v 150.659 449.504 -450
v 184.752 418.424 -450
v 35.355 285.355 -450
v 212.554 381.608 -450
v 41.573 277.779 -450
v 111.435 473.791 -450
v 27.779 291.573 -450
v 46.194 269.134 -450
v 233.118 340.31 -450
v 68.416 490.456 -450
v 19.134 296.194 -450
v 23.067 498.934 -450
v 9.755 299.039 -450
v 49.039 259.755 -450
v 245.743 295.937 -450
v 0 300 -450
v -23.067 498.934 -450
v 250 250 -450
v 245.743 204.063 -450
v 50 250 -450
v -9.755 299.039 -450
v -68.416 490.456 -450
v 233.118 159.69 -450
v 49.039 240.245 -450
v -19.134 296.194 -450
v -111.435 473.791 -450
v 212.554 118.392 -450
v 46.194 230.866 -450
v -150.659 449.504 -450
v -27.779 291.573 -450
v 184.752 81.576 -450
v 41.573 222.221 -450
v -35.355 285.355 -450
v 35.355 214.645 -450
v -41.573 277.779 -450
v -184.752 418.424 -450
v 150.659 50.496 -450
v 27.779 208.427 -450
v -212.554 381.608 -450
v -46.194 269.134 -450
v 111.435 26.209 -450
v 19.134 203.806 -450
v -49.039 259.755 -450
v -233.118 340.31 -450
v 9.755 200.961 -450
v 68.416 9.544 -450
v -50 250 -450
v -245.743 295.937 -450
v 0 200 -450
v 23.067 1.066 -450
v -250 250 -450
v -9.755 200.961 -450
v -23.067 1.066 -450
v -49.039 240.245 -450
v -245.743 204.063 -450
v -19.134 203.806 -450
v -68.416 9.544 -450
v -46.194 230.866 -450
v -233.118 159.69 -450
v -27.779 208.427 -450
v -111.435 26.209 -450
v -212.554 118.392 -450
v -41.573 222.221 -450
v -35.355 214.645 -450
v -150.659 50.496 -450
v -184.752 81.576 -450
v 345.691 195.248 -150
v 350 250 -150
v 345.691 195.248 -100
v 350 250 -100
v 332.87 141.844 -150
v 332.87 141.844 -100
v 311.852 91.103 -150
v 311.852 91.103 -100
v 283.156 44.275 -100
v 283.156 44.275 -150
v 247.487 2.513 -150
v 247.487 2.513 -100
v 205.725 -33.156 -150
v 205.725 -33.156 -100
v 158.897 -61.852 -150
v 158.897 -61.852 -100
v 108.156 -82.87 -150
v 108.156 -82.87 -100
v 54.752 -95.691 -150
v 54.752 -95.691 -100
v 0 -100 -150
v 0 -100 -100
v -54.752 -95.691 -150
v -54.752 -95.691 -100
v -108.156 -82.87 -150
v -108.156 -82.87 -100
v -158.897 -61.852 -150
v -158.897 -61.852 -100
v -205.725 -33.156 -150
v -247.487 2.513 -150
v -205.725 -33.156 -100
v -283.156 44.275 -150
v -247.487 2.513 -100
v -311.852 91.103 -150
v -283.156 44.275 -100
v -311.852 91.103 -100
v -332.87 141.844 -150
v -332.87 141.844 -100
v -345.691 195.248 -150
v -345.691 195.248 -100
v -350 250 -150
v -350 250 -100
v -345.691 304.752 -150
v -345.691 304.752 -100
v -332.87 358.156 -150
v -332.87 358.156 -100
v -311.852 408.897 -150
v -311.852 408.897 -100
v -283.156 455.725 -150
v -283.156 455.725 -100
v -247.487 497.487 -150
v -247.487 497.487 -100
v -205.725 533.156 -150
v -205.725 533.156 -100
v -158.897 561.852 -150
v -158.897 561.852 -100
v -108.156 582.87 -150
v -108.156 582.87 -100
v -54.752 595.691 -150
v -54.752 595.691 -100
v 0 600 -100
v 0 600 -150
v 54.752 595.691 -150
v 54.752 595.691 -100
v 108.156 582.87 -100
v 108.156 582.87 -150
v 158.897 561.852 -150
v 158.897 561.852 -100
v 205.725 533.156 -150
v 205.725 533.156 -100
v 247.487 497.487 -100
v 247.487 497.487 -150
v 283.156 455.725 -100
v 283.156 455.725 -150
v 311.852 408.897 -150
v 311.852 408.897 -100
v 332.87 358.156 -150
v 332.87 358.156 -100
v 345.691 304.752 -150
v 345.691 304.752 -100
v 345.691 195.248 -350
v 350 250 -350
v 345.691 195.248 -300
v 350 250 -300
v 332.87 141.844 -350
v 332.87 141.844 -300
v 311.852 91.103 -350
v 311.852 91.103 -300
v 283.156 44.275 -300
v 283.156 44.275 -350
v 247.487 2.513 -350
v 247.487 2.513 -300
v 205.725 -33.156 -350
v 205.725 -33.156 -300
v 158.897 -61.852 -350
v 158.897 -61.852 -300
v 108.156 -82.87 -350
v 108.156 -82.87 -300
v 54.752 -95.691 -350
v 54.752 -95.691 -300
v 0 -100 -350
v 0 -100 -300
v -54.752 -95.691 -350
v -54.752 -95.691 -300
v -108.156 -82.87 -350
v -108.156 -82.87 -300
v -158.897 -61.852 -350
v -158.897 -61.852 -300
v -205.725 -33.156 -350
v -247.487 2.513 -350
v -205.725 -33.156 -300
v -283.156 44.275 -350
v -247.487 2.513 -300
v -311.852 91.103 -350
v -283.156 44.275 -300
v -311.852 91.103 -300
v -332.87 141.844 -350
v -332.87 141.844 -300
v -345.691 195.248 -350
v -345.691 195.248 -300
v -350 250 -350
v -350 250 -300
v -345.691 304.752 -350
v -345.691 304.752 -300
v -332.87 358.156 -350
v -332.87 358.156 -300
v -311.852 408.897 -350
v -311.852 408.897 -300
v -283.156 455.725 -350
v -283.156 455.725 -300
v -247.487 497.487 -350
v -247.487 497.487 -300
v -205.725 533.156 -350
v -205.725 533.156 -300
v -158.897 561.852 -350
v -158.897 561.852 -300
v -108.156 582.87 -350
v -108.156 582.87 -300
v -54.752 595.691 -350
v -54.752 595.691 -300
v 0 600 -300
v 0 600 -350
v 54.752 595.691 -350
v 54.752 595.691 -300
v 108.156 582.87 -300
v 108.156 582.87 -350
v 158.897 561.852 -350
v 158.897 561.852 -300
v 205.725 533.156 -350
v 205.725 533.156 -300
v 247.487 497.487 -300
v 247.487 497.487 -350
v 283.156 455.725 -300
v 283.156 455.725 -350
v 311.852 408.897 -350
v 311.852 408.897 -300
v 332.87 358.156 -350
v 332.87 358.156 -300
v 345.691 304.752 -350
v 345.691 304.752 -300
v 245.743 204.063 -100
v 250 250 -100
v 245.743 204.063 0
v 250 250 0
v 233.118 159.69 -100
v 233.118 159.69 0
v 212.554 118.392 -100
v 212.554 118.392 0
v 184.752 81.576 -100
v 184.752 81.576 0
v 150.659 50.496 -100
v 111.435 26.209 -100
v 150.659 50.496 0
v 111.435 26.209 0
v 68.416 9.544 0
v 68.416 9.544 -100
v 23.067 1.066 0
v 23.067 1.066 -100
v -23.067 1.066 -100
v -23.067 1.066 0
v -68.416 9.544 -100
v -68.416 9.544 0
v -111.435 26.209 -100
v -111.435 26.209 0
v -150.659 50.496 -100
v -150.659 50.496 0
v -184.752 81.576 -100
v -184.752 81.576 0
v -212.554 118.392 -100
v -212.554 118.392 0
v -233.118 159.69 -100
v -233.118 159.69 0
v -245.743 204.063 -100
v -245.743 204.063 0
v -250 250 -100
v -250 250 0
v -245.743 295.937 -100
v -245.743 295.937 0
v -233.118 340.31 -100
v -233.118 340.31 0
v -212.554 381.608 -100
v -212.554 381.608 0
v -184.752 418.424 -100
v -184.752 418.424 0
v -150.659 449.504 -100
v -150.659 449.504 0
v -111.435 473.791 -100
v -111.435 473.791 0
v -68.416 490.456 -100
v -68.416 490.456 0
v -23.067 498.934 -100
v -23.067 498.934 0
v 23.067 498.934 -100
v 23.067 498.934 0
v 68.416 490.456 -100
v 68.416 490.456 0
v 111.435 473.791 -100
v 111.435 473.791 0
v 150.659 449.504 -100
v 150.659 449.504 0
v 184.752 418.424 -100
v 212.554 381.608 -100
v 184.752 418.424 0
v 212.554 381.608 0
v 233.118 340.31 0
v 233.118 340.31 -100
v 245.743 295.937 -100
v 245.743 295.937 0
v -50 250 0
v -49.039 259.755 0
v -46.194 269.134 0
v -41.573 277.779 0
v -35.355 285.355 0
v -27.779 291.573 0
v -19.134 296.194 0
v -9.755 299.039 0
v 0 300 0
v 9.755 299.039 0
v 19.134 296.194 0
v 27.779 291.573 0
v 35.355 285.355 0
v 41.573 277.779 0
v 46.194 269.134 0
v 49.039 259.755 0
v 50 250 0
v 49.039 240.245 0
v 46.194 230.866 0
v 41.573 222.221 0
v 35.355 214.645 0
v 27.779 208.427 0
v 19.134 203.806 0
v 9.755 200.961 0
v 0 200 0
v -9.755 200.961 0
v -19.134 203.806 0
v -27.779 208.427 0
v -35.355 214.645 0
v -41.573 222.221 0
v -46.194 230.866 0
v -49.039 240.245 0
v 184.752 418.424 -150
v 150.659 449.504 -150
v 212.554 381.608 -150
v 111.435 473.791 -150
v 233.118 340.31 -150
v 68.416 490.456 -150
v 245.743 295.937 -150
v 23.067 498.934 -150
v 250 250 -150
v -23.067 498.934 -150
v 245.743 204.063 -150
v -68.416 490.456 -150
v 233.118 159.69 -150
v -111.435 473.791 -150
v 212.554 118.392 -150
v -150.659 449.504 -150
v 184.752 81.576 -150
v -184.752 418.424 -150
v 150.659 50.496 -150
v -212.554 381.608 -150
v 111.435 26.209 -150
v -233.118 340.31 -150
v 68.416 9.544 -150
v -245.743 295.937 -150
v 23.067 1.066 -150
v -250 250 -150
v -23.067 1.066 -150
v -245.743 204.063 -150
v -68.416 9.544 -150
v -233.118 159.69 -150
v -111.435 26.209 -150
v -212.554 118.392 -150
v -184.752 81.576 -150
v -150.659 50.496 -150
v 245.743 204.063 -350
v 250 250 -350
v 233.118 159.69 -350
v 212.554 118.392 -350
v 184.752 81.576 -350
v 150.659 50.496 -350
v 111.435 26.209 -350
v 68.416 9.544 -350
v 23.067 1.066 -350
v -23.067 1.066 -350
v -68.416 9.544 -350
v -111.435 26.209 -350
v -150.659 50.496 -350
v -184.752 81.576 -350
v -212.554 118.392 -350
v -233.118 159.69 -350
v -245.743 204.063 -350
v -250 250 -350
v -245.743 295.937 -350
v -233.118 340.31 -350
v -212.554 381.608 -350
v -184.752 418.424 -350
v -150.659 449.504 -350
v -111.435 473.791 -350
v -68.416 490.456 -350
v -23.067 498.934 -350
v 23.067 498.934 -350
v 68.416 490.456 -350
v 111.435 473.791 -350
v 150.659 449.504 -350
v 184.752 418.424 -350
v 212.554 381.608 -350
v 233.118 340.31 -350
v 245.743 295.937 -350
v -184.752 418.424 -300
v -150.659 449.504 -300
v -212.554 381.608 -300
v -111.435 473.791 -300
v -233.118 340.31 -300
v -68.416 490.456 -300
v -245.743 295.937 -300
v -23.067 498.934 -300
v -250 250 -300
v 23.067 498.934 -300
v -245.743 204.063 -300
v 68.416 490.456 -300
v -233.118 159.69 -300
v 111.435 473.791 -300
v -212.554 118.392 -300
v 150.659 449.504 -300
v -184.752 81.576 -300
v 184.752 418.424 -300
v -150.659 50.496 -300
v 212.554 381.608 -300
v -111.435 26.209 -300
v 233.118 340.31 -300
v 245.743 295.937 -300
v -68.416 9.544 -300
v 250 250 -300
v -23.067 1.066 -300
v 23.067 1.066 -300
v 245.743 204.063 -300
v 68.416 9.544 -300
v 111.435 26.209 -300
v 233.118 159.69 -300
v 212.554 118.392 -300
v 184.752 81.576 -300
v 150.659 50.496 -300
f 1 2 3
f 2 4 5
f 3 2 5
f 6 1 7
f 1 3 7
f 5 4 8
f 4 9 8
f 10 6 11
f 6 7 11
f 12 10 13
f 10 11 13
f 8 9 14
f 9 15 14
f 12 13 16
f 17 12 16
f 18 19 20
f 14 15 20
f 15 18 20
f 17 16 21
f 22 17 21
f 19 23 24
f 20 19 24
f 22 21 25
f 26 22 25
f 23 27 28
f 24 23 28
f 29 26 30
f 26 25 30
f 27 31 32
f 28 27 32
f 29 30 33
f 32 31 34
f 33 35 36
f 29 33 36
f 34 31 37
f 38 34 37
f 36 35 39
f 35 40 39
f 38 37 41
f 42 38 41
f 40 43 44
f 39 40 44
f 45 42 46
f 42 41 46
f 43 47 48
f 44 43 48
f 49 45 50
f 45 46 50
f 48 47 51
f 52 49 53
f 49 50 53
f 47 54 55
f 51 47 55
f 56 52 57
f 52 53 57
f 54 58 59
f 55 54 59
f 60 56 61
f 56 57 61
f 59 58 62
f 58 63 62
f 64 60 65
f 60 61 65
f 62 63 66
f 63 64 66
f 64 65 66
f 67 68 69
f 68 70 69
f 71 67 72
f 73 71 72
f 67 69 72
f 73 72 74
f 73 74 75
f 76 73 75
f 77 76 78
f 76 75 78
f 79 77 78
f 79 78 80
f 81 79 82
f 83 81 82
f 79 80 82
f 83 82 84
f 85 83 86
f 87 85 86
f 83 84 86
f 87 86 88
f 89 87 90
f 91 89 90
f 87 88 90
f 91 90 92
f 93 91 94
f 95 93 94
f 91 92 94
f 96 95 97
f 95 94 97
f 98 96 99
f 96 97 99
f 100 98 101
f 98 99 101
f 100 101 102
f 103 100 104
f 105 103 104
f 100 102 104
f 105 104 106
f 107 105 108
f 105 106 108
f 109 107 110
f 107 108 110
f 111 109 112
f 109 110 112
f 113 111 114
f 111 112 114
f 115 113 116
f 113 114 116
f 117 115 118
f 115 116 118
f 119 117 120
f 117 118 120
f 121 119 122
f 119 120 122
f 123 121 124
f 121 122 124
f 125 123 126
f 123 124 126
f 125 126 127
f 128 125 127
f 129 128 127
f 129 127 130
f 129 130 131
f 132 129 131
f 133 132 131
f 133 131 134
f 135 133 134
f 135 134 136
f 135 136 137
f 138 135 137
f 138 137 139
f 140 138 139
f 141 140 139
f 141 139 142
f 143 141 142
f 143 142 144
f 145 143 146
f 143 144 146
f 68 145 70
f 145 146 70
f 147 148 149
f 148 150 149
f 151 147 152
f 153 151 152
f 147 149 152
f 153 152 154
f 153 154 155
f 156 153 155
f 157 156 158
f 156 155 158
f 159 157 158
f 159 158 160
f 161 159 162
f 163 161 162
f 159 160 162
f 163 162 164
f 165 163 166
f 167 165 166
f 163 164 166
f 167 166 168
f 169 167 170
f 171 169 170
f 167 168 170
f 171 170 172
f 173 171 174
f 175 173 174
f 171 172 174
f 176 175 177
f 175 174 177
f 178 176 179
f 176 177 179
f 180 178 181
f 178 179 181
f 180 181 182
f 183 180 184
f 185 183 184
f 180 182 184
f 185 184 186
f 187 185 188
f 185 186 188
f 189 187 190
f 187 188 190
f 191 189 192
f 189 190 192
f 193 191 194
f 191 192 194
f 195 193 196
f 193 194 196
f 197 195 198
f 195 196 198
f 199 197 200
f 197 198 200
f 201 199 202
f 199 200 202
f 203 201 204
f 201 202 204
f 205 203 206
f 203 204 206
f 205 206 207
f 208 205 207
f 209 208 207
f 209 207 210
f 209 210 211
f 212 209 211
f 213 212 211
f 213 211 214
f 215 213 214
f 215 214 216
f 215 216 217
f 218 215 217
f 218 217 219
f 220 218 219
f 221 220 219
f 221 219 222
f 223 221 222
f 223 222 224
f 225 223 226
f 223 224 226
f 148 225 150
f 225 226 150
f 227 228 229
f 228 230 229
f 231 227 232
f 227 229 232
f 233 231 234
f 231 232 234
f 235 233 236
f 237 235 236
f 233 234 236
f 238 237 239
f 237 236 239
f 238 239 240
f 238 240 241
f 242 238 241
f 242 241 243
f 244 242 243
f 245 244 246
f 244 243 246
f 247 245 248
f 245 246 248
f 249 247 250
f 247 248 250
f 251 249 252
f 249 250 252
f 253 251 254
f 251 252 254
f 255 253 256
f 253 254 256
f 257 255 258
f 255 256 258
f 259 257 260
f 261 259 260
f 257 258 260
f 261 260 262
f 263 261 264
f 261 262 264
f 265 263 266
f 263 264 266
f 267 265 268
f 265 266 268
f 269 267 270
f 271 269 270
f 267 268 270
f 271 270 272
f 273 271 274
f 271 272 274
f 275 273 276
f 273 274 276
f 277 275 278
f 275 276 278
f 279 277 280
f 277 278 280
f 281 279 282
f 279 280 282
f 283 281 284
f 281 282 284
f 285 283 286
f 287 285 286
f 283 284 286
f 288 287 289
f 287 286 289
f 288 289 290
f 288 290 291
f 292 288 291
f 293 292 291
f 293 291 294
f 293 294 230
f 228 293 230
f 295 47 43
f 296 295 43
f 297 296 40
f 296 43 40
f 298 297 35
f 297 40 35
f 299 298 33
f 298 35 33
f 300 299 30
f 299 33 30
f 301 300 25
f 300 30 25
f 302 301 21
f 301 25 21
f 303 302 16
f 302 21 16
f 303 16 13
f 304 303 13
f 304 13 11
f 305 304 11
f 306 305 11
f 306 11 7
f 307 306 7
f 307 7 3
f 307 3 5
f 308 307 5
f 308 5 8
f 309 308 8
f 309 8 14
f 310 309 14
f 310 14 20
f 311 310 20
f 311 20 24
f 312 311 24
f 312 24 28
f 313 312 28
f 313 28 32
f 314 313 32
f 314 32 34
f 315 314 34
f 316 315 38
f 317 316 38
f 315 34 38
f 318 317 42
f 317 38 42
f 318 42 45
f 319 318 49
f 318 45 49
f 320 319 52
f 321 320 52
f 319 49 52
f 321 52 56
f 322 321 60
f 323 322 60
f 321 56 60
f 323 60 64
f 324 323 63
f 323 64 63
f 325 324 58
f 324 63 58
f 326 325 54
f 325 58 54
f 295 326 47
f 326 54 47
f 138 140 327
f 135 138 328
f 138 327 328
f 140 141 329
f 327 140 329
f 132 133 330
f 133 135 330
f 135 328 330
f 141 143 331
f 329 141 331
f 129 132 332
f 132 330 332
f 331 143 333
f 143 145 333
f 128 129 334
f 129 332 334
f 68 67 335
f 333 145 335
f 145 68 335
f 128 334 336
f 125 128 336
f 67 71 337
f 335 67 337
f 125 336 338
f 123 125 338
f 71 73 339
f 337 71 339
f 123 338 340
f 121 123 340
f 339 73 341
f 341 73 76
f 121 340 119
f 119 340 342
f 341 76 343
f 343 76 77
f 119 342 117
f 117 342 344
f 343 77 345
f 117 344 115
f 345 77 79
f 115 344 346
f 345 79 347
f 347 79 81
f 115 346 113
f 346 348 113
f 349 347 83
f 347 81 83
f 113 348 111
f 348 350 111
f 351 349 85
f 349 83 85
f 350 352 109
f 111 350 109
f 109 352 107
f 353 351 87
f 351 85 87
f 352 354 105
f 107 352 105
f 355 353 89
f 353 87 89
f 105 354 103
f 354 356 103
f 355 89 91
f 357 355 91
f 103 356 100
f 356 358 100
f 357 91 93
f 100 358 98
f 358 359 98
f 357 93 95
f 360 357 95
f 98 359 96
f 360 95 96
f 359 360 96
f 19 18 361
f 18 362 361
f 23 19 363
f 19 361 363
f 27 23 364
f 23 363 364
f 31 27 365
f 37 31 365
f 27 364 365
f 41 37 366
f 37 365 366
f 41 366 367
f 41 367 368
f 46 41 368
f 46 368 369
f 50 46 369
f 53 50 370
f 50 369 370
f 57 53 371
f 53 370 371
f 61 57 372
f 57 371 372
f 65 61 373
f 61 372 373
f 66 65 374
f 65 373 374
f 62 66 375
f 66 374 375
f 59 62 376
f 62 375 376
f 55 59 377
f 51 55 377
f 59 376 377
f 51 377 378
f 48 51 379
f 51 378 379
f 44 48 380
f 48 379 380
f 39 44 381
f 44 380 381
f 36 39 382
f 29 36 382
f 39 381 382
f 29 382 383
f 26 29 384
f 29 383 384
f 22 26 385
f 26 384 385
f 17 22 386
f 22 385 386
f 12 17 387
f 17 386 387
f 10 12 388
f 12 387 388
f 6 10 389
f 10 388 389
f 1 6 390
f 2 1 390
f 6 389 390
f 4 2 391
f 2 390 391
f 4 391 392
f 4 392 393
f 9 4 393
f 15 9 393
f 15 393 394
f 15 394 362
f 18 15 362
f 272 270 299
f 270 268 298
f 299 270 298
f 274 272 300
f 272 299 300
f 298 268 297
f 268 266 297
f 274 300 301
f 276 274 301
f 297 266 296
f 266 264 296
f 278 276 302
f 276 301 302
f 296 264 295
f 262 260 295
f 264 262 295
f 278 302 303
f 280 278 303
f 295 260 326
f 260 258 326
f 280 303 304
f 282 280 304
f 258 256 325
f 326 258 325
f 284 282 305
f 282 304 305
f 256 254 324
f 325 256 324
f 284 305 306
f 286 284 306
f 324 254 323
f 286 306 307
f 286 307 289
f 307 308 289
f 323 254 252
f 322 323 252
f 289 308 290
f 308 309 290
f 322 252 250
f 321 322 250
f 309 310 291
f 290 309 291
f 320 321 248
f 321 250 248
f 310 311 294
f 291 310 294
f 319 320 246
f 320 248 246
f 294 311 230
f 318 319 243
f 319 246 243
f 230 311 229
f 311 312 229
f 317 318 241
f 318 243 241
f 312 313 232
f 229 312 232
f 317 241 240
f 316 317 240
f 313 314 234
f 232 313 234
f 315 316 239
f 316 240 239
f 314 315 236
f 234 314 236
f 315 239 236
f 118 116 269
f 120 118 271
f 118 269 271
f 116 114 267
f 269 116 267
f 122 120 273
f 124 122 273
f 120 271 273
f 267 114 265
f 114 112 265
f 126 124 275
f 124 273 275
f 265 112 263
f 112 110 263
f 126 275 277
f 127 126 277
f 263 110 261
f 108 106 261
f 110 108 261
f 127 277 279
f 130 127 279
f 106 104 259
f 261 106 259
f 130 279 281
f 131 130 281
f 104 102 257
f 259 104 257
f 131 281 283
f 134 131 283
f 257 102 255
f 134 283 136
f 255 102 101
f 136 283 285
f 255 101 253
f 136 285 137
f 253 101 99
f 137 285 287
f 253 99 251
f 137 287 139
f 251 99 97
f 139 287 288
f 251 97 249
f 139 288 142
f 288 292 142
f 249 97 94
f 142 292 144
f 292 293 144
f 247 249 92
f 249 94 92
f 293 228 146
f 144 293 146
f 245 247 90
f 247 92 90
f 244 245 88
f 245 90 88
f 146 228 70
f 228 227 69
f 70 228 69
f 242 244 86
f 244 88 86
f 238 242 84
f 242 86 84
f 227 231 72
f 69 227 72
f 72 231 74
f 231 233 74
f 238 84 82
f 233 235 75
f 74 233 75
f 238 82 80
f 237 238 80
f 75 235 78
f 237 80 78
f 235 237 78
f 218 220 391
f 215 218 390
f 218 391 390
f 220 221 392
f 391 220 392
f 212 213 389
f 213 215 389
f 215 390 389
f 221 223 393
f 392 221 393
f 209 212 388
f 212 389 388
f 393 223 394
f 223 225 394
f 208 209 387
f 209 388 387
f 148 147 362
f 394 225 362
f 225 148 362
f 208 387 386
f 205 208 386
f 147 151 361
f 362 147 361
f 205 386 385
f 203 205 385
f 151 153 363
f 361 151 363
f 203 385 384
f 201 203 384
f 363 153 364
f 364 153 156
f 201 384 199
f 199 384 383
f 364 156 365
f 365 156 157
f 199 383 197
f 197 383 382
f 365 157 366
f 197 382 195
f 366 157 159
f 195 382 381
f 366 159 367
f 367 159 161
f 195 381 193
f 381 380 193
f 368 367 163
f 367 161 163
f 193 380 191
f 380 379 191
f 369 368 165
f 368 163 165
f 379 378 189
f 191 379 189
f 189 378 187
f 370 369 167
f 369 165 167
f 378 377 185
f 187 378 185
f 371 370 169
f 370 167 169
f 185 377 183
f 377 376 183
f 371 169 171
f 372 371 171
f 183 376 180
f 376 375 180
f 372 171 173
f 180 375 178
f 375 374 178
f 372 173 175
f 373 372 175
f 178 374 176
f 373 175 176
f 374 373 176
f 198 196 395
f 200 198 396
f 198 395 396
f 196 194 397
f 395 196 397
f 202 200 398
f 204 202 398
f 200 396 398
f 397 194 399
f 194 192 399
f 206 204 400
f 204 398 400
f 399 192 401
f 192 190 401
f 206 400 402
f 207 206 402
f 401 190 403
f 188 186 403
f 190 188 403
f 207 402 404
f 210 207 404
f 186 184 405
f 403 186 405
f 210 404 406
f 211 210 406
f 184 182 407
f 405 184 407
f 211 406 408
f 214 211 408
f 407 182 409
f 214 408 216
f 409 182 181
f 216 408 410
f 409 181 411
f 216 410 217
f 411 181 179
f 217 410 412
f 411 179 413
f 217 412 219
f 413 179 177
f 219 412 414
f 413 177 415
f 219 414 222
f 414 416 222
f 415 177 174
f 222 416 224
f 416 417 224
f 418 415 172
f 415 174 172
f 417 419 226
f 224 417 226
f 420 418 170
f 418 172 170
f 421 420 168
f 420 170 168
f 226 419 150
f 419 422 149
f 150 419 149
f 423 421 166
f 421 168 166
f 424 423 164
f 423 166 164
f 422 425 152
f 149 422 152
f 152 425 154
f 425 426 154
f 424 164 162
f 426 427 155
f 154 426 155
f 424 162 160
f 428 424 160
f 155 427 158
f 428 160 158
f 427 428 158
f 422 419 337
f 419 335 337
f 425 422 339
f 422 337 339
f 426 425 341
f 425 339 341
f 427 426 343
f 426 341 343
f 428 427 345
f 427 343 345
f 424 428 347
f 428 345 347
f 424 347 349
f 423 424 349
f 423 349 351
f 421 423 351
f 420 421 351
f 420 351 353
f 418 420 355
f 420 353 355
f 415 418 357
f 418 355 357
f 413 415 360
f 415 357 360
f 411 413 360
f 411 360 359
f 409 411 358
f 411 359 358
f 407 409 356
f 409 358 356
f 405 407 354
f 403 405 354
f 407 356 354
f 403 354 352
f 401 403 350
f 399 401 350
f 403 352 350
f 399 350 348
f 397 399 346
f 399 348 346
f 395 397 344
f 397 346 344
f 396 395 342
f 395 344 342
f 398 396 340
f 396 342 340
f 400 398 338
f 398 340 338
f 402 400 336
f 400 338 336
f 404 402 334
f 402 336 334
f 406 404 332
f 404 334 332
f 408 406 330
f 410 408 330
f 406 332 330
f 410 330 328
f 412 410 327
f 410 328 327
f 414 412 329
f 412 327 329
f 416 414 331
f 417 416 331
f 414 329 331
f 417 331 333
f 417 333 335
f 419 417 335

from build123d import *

# Parameters (mm, degrees)
SKETCH2_R          = 50
CUT_EXTRUDE1_DEPTH = 828.647267862


with BuildPart() as part:
    # Sketch1 → Revolve1 (revolve)
    with BuildSketch(Plane(origin=(0, 0, 0), x_dir=(0, 0, -1), z_dir=(1, 0, 0)), mode=Mode.PRIVATE) as revolve1_sk:
        Polygon((0, 0), (0, 250), (450, 250), (450, 0), (350, 0), (350, -100), (300, -100), (300, 0), (150, 0), (150, -100), (100, -100), (100, 0), align=None)
    revolve(revolve1_sk.sketch.rotate(Axis((0, 250, 0), (0, 0, -1)), 270), axis=Axis((0, 250, 0), (0, 0, -1)))

    # Sketch2 → Cut-Extrude1 (cut, through all)
    with BuildSketch(Plane(origin=(0, 0, -450), x_dir=(-1, 0, 0), z_dir=(0, 0, -1))):
        with Locations((0, 250)):
            Circle(SKETCH2_R)
    extrude(amount=-CUT_EXTRUDE1_DEPTH, mode=Mode.SUBTRACT)


solid = part.part
